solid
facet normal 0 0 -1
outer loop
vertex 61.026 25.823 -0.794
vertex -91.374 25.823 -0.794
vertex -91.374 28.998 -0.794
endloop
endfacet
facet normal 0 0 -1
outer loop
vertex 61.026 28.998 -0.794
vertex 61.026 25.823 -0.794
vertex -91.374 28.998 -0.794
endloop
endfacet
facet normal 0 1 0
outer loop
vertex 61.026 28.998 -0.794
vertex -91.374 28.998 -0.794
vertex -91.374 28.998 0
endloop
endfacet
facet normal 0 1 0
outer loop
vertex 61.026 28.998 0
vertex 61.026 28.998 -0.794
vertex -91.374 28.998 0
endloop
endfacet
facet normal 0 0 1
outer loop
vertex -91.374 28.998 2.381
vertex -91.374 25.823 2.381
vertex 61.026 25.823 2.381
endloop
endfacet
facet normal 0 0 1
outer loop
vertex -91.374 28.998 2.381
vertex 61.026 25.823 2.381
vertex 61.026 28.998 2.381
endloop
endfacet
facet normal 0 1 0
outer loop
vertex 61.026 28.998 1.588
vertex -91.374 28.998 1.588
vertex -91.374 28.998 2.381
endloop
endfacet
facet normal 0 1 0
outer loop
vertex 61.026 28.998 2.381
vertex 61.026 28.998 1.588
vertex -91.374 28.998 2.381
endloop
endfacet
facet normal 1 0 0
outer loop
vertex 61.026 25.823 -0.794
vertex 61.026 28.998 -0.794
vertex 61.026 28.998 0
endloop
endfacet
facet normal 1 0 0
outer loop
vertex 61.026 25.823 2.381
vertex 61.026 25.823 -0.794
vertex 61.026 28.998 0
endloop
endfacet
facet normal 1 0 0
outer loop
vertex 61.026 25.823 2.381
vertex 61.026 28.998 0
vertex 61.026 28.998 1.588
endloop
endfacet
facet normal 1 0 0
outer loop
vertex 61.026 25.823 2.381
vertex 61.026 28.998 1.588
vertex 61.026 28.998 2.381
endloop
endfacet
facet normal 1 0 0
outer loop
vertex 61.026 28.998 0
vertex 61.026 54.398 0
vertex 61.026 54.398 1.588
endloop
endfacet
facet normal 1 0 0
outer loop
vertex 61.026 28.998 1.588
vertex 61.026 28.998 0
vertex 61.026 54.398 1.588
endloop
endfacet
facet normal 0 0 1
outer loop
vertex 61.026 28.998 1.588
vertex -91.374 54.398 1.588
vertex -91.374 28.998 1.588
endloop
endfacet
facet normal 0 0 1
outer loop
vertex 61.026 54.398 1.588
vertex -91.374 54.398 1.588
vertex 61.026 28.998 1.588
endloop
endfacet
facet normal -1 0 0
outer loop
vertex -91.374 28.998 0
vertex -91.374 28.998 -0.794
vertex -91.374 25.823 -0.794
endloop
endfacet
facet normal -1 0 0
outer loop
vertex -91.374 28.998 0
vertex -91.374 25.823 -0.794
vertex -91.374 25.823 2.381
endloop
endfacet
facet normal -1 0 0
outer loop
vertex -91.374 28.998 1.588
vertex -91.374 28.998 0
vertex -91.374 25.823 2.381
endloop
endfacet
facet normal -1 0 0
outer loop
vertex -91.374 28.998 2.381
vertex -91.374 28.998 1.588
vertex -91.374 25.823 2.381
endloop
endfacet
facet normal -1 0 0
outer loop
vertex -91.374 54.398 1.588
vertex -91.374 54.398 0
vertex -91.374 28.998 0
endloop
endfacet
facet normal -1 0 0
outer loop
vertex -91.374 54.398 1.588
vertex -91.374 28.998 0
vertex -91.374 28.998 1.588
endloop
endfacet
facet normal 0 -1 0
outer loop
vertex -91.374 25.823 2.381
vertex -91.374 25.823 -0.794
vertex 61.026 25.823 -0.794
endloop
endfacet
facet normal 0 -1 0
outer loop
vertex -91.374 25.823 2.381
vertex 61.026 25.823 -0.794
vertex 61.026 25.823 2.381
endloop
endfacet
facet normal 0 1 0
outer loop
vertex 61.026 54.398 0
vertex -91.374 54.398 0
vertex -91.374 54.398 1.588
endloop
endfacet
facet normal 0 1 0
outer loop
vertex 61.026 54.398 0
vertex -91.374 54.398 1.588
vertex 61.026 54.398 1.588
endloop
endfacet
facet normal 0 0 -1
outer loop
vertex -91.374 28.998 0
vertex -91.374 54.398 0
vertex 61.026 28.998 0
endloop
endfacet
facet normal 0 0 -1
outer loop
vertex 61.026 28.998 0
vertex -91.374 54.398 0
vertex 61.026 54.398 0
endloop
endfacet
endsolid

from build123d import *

# Parameters (mm, degrees)
SKETCH1_W           = 152.4
SKETCH1_H           = 25.4
BOSS_EXTRUDE1_DEPTH = 1.5875
SKETCH2_W           = 3.175
SKETCH2_H           = 3.175
BOSS_EXTRUDE2_DEPTH = 152.4


with BuildPart() as part:
    # Sketch1 → Boss-Extrude1 (new body)
    with BuildSketch(Plane.XY):
        with Locations((-15.173816053, 41.697804783)):
            Rectangle(SKETCH1_W, SKETCH1_H)
    extrude(amount=BOSS_EXTRUDE1_DEPTH)

    # Sketch2 → Boss-Extrude2 (add)
    with BuildSketch(Plane.ZY.offset(91.373816053)):
        with Locations((0.79375, 27.410304783)):
            Rectangle(SKETCH2_W, SKETCH2_H)
    extrude(amount=-BOSS_EXTRUDE2_DEPTH)


solid = part.part
